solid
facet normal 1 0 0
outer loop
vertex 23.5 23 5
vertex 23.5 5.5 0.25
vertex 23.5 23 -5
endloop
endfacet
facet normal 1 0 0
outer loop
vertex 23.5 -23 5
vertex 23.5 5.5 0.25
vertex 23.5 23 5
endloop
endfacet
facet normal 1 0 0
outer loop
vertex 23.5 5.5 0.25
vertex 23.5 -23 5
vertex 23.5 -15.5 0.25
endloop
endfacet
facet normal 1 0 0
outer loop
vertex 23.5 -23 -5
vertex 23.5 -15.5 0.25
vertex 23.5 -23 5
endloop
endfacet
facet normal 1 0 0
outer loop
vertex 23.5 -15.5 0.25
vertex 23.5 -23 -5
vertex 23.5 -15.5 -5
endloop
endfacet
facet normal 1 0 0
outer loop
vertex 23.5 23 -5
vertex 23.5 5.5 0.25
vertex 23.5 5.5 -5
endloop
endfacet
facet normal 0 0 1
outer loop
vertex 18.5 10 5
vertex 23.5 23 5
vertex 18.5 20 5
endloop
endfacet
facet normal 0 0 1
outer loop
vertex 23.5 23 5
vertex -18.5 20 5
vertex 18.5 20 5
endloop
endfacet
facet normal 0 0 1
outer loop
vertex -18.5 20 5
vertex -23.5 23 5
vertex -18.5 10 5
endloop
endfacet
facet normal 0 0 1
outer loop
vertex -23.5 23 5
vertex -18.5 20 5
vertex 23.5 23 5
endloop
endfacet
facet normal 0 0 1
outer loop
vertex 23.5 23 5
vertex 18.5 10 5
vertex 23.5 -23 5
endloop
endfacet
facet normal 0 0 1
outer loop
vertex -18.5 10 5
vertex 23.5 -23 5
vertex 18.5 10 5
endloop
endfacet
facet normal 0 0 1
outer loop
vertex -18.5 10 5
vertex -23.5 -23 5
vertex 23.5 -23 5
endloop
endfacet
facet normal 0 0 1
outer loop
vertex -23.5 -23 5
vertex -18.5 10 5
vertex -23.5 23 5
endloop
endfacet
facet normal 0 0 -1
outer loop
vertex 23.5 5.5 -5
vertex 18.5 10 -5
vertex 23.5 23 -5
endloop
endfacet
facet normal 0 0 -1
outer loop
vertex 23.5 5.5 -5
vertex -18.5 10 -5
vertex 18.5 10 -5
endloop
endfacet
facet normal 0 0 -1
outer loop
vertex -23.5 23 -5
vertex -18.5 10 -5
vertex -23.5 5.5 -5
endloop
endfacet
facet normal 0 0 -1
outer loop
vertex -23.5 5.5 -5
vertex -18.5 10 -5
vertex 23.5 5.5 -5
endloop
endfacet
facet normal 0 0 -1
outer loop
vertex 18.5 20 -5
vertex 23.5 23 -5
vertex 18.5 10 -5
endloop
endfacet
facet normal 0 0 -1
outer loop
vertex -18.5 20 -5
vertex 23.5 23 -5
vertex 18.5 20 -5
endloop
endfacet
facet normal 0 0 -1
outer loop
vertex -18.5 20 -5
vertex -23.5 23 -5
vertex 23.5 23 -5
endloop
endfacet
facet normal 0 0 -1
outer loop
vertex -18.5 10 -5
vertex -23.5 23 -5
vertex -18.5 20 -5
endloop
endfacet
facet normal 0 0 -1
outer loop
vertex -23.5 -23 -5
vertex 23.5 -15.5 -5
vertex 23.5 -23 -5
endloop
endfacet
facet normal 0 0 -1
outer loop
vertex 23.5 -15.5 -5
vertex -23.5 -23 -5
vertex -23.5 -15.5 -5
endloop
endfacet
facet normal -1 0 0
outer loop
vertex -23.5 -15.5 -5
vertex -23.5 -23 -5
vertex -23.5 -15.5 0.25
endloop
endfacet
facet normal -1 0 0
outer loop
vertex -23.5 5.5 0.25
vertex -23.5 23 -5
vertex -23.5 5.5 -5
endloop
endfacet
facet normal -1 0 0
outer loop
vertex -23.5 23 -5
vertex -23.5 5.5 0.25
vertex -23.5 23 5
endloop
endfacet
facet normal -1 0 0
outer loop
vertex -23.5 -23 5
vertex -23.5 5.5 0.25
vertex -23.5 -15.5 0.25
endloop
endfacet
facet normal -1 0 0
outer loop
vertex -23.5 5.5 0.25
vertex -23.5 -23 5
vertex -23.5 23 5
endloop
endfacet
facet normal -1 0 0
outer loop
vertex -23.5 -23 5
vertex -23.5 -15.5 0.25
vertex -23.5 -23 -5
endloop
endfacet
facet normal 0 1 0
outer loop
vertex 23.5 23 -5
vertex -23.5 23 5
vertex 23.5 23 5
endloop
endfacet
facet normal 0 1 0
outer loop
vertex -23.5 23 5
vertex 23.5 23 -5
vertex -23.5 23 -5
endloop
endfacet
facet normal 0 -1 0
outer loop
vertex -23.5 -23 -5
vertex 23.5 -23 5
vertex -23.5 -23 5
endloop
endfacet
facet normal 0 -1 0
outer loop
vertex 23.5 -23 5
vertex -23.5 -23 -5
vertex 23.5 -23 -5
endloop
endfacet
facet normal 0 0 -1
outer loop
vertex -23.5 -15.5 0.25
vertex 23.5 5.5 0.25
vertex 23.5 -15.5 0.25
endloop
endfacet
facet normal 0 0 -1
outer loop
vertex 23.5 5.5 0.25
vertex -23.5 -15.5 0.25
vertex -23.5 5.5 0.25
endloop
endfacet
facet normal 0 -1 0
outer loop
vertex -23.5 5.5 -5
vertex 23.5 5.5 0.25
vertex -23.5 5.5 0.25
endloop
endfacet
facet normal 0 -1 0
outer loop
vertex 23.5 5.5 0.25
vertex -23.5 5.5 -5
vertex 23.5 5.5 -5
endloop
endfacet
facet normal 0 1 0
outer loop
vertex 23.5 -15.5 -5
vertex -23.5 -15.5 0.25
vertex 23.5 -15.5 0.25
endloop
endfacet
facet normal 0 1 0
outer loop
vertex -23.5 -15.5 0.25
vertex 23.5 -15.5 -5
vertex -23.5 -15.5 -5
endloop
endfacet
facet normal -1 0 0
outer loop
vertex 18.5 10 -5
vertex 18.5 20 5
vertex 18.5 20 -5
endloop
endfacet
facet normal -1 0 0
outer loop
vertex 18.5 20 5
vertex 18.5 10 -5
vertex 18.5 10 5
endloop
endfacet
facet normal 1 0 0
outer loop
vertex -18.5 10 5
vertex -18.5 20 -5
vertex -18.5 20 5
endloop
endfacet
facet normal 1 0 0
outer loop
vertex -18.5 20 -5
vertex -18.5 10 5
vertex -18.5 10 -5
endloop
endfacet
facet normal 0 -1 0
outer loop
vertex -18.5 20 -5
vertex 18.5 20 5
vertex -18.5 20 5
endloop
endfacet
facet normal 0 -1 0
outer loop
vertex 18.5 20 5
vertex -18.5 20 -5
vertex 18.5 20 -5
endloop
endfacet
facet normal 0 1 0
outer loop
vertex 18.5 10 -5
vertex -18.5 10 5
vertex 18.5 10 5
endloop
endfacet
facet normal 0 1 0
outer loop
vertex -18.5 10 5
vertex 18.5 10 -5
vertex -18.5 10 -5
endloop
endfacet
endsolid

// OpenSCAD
BASE_WIDTH = 37;
BASE_DEPTH = 10;
BASE_HEIGHT = 26;
MONITOR_DEPTH = 21;
MONITOR_BEZZLE = 5;

//cube([BASE_WIDTH, 10, BASE_HEIGHT]);

difference() {
    cube([BASE_WIDTH + 10, MONITOR_DEPTH + 25, 5 + MONITOR_BEZZLE], center=true);
    translate([0, -5, -2.5]) {
        cube([BASE_WIDTH + 10 + 2, MONITOR_DEPTH, MONITOR_BEZZLE + 0.5], center=true);
    }
    translate([0, 15, 0]) {
        cube([BASE_WIDTH, BASE_DEPTH, 5 + MONITOR_BEZZLE + 2], center=true);
    }
}
